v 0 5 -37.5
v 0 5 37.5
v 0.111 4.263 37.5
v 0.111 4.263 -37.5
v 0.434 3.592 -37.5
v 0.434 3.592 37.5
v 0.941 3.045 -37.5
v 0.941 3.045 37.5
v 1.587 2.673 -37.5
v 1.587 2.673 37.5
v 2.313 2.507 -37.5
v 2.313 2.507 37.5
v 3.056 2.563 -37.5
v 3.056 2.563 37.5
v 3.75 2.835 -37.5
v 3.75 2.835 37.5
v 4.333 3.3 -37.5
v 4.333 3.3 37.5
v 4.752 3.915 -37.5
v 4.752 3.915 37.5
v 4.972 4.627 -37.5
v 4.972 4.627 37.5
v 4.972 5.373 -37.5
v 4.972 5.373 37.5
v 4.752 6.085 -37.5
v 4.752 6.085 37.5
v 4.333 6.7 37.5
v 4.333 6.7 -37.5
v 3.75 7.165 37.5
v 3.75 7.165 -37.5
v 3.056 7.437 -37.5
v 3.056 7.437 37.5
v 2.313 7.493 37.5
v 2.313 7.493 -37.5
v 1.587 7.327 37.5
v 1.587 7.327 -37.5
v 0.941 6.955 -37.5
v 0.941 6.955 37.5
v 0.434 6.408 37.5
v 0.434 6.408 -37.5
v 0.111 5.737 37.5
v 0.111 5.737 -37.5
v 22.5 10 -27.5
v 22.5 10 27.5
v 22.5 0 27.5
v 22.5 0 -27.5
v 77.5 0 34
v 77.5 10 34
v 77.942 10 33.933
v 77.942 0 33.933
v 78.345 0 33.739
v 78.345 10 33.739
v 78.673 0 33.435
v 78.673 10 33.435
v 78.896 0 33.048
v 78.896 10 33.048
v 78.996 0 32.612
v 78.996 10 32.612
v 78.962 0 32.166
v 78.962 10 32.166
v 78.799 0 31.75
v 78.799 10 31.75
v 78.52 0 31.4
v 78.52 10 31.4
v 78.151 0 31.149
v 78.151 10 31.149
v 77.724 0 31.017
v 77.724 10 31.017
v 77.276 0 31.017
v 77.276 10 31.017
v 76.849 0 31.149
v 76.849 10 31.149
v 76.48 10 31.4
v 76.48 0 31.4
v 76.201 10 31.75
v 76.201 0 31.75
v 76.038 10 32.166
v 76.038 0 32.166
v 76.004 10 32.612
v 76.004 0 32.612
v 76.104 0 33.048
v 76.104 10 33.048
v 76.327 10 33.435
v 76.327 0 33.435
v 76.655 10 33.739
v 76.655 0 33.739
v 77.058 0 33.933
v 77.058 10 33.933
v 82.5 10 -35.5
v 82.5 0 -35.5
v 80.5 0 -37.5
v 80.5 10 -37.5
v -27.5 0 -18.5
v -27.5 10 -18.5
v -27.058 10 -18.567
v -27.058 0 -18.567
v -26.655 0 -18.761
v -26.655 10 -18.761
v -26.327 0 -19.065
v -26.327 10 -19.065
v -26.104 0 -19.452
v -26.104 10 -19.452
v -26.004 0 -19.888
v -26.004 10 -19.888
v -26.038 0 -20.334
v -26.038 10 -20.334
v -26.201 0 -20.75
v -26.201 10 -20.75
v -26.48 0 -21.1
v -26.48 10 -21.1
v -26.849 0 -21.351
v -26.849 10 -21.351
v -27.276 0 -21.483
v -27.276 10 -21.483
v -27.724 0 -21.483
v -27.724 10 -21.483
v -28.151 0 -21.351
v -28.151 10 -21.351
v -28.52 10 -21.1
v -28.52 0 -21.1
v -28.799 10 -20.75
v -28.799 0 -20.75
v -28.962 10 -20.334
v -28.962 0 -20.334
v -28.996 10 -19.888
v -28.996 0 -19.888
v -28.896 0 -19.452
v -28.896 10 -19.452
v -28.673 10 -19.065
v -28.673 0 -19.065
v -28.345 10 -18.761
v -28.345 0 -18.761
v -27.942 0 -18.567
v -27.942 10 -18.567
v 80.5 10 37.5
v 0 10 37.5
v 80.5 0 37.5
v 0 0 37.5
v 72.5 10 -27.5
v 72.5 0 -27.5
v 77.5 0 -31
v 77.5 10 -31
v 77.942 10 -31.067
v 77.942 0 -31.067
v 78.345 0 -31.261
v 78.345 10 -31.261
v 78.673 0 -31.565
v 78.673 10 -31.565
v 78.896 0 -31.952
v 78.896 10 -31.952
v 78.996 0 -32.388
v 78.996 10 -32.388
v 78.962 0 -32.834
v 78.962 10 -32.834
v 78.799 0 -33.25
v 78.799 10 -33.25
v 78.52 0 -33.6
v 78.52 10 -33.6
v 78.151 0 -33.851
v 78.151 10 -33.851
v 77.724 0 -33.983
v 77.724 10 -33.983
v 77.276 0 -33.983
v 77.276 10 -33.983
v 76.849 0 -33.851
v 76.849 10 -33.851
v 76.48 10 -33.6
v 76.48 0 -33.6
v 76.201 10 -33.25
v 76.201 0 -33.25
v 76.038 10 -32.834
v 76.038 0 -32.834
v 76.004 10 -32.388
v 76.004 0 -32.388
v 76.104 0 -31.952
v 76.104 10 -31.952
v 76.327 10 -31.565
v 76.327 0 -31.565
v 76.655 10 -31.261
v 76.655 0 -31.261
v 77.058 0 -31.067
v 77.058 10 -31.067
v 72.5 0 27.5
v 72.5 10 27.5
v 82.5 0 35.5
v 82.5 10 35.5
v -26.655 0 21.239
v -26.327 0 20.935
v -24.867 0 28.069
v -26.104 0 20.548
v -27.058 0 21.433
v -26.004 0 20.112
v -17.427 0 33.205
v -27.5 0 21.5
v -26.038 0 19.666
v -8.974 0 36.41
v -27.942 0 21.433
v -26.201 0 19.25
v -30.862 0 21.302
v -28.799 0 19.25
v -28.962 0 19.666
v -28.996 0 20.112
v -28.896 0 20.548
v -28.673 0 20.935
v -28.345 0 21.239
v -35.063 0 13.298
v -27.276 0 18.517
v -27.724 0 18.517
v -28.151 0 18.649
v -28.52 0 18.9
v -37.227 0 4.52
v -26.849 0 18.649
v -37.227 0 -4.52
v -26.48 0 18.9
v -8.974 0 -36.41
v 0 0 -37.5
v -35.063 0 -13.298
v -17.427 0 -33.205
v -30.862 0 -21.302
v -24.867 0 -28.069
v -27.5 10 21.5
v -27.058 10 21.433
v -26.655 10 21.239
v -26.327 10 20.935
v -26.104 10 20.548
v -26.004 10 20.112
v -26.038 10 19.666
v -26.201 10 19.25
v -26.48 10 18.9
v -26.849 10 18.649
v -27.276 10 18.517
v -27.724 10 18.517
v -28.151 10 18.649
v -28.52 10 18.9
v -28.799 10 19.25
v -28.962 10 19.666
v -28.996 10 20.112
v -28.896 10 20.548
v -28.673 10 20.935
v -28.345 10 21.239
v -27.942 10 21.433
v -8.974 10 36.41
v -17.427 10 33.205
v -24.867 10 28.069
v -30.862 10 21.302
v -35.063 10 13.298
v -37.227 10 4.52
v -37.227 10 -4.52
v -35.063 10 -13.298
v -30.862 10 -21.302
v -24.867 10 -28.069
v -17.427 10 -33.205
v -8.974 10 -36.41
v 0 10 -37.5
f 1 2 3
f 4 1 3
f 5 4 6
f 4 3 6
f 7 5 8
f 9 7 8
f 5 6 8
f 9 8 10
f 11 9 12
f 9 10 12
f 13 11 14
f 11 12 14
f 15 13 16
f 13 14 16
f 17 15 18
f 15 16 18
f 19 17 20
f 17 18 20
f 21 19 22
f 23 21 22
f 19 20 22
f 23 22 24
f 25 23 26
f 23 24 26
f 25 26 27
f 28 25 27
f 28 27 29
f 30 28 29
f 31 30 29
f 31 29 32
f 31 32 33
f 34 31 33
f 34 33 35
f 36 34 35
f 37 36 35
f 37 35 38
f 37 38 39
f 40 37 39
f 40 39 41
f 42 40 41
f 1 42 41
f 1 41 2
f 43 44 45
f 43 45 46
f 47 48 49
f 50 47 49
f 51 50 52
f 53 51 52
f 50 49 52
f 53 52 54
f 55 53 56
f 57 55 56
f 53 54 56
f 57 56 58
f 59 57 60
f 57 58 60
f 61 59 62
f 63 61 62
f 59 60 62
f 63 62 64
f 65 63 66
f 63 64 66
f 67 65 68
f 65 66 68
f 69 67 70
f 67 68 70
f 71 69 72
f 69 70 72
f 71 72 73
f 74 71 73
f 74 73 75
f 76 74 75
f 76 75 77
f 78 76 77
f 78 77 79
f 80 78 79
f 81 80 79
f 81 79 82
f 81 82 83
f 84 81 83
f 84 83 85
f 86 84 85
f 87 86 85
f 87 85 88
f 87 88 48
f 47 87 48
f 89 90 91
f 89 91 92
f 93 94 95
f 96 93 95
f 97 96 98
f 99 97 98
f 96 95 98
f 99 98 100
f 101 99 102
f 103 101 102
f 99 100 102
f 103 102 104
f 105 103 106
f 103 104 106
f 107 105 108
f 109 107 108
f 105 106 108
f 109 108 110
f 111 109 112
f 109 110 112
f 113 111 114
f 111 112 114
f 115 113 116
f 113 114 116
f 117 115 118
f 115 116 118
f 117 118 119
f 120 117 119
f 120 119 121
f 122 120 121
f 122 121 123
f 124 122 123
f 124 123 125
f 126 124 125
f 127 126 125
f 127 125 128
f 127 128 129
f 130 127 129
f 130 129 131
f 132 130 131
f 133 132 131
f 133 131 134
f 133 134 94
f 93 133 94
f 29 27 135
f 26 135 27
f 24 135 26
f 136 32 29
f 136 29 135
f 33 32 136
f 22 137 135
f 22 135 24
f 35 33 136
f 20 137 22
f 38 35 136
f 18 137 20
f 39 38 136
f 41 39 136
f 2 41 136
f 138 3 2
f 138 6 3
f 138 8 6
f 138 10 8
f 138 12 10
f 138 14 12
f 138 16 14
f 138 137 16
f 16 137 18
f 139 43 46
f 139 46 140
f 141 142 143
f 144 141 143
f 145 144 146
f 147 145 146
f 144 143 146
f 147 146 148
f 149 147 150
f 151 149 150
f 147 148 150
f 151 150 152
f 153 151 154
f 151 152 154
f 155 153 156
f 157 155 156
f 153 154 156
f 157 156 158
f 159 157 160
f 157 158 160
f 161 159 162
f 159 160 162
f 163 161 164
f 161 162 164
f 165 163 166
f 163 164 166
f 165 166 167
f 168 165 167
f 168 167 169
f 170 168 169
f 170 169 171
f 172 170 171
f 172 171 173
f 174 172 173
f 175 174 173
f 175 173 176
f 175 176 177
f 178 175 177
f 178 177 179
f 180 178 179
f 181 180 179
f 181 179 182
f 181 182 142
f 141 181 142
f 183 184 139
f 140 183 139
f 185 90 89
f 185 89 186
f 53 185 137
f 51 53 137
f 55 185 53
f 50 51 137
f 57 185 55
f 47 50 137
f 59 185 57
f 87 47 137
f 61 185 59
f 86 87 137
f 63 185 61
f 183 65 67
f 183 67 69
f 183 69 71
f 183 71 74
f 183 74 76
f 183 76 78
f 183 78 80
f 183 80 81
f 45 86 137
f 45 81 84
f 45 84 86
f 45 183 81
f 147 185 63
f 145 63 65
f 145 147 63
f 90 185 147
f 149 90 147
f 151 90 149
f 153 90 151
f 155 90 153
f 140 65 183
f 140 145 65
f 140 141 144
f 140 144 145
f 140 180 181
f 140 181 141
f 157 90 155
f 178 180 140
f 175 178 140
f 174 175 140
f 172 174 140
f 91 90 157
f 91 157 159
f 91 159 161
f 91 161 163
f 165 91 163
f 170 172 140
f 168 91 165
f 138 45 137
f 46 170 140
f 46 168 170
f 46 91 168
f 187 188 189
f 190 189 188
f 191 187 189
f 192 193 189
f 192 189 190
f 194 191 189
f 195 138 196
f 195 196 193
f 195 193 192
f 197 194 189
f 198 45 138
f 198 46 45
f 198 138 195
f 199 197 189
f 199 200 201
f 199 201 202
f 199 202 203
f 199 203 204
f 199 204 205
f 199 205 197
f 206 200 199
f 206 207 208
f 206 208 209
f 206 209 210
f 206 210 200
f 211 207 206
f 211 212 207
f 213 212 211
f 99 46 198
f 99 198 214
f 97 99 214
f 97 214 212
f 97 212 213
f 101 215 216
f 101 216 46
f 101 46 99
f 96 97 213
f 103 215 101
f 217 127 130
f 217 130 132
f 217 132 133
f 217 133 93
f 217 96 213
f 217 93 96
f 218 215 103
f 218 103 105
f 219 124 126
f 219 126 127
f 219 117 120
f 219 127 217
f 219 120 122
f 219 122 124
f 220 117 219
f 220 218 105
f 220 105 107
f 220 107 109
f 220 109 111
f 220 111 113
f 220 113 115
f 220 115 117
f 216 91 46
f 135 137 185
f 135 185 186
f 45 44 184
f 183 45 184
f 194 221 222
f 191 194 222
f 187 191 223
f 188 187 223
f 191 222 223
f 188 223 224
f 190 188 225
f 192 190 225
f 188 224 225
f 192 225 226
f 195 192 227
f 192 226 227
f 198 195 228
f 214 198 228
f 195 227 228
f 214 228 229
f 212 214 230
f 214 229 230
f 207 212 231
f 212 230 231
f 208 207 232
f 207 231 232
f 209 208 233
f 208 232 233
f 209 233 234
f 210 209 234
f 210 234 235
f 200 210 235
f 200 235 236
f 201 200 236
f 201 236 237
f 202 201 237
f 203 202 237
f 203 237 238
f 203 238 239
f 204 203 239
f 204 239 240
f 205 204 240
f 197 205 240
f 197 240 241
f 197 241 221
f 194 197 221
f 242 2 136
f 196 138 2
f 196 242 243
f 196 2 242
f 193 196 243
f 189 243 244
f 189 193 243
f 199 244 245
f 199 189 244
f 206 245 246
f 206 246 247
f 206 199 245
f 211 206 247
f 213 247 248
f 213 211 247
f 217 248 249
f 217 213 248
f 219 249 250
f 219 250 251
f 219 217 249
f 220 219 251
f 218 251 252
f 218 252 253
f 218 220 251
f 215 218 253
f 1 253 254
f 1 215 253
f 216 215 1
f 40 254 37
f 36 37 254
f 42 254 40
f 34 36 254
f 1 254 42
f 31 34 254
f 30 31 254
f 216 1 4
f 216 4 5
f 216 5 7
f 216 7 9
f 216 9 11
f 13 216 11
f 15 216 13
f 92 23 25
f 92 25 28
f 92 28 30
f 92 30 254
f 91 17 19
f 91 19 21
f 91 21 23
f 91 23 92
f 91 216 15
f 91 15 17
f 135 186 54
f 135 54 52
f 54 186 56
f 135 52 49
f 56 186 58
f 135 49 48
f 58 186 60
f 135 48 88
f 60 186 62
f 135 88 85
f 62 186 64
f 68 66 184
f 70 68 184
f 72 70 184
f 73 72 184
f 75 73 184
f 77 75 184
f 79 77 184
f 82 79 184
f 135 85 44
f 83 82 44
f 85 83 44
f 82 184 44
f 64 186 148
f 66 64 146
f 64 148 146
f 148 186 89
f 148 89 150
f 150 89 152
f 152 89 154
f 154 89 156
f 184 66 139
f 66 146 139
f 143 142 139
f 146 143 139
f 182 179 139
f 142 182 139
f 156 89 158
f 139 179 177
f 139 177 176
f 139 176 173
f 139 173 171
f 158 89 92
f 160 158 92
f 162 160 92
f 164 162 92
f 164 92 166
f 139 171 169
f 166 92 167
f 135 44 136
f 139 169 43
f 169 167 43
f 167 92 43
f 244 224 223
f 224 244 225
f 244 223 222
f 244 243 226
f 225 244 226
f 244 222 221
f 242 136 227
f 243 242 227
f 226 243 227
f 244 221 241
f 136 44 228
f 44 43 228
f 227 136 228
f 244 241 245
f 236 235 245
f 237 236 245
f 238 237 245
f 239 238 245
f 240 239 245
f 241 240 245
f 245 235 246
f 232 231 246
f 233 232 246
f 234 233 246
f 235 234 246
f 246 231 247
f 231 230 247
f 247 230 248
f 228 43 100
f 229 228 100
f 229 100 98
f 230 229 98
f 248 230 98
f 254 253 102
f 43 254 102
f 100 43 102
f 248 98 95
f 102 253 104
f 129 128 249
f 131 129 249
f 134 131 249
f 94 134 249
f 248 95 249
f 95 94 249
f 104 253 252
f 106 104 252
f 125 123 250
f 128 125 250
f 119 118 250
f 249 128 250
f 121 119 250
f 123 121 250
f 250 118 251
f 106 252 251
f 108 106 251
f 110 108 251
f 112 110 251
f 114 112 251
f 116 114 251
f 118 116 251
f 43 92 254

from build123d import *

# Parameters (mm, degrees)
EXTRUDE_1_DEPTH     = 10
SKETCH_2_R          = 2.5
CUT_EXTRUDE_1_DEPTH = 112.943065886
SKETCH_3_R          = 1.5
CUT_EXTRUDE_2_DEPTH = 92.172912644
SKETCH_4_W          = 50
SKETCH_4_H          = 55
CUT_EXTRUDE_3_DEPTH = 92.172912644
CHAMFER_1_SIZE      = 2


with BuildPart() as part:
    # 草图1 → 凸台-拉伸1 (new body)
    with BuildSketch(Plane(origin=(0, 0, 0), x_dir=(1, 0, 0), z_dir=(0, 1, 0))):
        with BuildLine():
            Line((0, 37.5), (82.5, 37.5))
            Line((82.5, 37.5), (82.5, -37.5))
            Line((82.5, -37.5), (0, -37.5))
            ThreePointArc((0, -37.5), (-37.5, 0), (0, 37.5))
        make_face()
    extrude(amount=EXTRUDE_1_DEPTH)

    # 草图2 → 切除-拉伸1 (cut, through all)
    with BuildSketch(Plane.XY.offset(37.5)):
        with Locations(Location((2.5, 5, 0), (0, 0, 180))):
            Circle(SKETCH_2_R)
    extrude(amount=-CUT_EXTRUDE_1_DEPTH, mode=Mode.SUBTRACT)

    # 草图3 → 切除-拉伸2 (cut, through all)
    with BuildSketch(Plane(origin=(0, 10, 0), x_dir=(1, 0, 0), z_dir=(0, 1, 0))):
        with Locations(Location((-27.5, 20, 0), (0, 0, 270))):
            Circle(SKETCH_3_R)
        with Locations(Location((-27.5, -20, 0), (0, 0, 270))):
            Circle(SKETCH_3_R)
        with Locations(Location((77.5, 32.5, 0), (0, 0, 270))):
            Circle(SKETCH_3_R)
        with Locations(Location((77.5, -32.5, 0), (0, 0, 270))):
            Circle(SKETCH_3_R)
    extrude(amount=-CUT_EXTRUDE_2_DEPTH, mode=Mode.SUBTRACT)

    # 草图4 → 切除-拉伸3 (cut, through all)
    with BuildSketch(Plane(origin=(0, 10, 0), x_dir=(1, 0, 0), z_dir=(0, 1, 0))):
        with Locations((47.5, 0)):
            Rectangle(SKETCH_4_W, SKETCH_4_H)
    extrude(amount=-CUT_EXTRUDE_3_DEPTH, mode=Mode.SUBTRACT)

    # 倒角1
    chamfer_1_edges = [part.edges().sort_by_distance(p)[0] for p in [
        (82.5, 5, -37.5),
        (82.5, 5, 37.5),
    ]]
    chamfer(chamfer_1_edges, length=CHAMFER_1_SIZE)


solid = part.part
